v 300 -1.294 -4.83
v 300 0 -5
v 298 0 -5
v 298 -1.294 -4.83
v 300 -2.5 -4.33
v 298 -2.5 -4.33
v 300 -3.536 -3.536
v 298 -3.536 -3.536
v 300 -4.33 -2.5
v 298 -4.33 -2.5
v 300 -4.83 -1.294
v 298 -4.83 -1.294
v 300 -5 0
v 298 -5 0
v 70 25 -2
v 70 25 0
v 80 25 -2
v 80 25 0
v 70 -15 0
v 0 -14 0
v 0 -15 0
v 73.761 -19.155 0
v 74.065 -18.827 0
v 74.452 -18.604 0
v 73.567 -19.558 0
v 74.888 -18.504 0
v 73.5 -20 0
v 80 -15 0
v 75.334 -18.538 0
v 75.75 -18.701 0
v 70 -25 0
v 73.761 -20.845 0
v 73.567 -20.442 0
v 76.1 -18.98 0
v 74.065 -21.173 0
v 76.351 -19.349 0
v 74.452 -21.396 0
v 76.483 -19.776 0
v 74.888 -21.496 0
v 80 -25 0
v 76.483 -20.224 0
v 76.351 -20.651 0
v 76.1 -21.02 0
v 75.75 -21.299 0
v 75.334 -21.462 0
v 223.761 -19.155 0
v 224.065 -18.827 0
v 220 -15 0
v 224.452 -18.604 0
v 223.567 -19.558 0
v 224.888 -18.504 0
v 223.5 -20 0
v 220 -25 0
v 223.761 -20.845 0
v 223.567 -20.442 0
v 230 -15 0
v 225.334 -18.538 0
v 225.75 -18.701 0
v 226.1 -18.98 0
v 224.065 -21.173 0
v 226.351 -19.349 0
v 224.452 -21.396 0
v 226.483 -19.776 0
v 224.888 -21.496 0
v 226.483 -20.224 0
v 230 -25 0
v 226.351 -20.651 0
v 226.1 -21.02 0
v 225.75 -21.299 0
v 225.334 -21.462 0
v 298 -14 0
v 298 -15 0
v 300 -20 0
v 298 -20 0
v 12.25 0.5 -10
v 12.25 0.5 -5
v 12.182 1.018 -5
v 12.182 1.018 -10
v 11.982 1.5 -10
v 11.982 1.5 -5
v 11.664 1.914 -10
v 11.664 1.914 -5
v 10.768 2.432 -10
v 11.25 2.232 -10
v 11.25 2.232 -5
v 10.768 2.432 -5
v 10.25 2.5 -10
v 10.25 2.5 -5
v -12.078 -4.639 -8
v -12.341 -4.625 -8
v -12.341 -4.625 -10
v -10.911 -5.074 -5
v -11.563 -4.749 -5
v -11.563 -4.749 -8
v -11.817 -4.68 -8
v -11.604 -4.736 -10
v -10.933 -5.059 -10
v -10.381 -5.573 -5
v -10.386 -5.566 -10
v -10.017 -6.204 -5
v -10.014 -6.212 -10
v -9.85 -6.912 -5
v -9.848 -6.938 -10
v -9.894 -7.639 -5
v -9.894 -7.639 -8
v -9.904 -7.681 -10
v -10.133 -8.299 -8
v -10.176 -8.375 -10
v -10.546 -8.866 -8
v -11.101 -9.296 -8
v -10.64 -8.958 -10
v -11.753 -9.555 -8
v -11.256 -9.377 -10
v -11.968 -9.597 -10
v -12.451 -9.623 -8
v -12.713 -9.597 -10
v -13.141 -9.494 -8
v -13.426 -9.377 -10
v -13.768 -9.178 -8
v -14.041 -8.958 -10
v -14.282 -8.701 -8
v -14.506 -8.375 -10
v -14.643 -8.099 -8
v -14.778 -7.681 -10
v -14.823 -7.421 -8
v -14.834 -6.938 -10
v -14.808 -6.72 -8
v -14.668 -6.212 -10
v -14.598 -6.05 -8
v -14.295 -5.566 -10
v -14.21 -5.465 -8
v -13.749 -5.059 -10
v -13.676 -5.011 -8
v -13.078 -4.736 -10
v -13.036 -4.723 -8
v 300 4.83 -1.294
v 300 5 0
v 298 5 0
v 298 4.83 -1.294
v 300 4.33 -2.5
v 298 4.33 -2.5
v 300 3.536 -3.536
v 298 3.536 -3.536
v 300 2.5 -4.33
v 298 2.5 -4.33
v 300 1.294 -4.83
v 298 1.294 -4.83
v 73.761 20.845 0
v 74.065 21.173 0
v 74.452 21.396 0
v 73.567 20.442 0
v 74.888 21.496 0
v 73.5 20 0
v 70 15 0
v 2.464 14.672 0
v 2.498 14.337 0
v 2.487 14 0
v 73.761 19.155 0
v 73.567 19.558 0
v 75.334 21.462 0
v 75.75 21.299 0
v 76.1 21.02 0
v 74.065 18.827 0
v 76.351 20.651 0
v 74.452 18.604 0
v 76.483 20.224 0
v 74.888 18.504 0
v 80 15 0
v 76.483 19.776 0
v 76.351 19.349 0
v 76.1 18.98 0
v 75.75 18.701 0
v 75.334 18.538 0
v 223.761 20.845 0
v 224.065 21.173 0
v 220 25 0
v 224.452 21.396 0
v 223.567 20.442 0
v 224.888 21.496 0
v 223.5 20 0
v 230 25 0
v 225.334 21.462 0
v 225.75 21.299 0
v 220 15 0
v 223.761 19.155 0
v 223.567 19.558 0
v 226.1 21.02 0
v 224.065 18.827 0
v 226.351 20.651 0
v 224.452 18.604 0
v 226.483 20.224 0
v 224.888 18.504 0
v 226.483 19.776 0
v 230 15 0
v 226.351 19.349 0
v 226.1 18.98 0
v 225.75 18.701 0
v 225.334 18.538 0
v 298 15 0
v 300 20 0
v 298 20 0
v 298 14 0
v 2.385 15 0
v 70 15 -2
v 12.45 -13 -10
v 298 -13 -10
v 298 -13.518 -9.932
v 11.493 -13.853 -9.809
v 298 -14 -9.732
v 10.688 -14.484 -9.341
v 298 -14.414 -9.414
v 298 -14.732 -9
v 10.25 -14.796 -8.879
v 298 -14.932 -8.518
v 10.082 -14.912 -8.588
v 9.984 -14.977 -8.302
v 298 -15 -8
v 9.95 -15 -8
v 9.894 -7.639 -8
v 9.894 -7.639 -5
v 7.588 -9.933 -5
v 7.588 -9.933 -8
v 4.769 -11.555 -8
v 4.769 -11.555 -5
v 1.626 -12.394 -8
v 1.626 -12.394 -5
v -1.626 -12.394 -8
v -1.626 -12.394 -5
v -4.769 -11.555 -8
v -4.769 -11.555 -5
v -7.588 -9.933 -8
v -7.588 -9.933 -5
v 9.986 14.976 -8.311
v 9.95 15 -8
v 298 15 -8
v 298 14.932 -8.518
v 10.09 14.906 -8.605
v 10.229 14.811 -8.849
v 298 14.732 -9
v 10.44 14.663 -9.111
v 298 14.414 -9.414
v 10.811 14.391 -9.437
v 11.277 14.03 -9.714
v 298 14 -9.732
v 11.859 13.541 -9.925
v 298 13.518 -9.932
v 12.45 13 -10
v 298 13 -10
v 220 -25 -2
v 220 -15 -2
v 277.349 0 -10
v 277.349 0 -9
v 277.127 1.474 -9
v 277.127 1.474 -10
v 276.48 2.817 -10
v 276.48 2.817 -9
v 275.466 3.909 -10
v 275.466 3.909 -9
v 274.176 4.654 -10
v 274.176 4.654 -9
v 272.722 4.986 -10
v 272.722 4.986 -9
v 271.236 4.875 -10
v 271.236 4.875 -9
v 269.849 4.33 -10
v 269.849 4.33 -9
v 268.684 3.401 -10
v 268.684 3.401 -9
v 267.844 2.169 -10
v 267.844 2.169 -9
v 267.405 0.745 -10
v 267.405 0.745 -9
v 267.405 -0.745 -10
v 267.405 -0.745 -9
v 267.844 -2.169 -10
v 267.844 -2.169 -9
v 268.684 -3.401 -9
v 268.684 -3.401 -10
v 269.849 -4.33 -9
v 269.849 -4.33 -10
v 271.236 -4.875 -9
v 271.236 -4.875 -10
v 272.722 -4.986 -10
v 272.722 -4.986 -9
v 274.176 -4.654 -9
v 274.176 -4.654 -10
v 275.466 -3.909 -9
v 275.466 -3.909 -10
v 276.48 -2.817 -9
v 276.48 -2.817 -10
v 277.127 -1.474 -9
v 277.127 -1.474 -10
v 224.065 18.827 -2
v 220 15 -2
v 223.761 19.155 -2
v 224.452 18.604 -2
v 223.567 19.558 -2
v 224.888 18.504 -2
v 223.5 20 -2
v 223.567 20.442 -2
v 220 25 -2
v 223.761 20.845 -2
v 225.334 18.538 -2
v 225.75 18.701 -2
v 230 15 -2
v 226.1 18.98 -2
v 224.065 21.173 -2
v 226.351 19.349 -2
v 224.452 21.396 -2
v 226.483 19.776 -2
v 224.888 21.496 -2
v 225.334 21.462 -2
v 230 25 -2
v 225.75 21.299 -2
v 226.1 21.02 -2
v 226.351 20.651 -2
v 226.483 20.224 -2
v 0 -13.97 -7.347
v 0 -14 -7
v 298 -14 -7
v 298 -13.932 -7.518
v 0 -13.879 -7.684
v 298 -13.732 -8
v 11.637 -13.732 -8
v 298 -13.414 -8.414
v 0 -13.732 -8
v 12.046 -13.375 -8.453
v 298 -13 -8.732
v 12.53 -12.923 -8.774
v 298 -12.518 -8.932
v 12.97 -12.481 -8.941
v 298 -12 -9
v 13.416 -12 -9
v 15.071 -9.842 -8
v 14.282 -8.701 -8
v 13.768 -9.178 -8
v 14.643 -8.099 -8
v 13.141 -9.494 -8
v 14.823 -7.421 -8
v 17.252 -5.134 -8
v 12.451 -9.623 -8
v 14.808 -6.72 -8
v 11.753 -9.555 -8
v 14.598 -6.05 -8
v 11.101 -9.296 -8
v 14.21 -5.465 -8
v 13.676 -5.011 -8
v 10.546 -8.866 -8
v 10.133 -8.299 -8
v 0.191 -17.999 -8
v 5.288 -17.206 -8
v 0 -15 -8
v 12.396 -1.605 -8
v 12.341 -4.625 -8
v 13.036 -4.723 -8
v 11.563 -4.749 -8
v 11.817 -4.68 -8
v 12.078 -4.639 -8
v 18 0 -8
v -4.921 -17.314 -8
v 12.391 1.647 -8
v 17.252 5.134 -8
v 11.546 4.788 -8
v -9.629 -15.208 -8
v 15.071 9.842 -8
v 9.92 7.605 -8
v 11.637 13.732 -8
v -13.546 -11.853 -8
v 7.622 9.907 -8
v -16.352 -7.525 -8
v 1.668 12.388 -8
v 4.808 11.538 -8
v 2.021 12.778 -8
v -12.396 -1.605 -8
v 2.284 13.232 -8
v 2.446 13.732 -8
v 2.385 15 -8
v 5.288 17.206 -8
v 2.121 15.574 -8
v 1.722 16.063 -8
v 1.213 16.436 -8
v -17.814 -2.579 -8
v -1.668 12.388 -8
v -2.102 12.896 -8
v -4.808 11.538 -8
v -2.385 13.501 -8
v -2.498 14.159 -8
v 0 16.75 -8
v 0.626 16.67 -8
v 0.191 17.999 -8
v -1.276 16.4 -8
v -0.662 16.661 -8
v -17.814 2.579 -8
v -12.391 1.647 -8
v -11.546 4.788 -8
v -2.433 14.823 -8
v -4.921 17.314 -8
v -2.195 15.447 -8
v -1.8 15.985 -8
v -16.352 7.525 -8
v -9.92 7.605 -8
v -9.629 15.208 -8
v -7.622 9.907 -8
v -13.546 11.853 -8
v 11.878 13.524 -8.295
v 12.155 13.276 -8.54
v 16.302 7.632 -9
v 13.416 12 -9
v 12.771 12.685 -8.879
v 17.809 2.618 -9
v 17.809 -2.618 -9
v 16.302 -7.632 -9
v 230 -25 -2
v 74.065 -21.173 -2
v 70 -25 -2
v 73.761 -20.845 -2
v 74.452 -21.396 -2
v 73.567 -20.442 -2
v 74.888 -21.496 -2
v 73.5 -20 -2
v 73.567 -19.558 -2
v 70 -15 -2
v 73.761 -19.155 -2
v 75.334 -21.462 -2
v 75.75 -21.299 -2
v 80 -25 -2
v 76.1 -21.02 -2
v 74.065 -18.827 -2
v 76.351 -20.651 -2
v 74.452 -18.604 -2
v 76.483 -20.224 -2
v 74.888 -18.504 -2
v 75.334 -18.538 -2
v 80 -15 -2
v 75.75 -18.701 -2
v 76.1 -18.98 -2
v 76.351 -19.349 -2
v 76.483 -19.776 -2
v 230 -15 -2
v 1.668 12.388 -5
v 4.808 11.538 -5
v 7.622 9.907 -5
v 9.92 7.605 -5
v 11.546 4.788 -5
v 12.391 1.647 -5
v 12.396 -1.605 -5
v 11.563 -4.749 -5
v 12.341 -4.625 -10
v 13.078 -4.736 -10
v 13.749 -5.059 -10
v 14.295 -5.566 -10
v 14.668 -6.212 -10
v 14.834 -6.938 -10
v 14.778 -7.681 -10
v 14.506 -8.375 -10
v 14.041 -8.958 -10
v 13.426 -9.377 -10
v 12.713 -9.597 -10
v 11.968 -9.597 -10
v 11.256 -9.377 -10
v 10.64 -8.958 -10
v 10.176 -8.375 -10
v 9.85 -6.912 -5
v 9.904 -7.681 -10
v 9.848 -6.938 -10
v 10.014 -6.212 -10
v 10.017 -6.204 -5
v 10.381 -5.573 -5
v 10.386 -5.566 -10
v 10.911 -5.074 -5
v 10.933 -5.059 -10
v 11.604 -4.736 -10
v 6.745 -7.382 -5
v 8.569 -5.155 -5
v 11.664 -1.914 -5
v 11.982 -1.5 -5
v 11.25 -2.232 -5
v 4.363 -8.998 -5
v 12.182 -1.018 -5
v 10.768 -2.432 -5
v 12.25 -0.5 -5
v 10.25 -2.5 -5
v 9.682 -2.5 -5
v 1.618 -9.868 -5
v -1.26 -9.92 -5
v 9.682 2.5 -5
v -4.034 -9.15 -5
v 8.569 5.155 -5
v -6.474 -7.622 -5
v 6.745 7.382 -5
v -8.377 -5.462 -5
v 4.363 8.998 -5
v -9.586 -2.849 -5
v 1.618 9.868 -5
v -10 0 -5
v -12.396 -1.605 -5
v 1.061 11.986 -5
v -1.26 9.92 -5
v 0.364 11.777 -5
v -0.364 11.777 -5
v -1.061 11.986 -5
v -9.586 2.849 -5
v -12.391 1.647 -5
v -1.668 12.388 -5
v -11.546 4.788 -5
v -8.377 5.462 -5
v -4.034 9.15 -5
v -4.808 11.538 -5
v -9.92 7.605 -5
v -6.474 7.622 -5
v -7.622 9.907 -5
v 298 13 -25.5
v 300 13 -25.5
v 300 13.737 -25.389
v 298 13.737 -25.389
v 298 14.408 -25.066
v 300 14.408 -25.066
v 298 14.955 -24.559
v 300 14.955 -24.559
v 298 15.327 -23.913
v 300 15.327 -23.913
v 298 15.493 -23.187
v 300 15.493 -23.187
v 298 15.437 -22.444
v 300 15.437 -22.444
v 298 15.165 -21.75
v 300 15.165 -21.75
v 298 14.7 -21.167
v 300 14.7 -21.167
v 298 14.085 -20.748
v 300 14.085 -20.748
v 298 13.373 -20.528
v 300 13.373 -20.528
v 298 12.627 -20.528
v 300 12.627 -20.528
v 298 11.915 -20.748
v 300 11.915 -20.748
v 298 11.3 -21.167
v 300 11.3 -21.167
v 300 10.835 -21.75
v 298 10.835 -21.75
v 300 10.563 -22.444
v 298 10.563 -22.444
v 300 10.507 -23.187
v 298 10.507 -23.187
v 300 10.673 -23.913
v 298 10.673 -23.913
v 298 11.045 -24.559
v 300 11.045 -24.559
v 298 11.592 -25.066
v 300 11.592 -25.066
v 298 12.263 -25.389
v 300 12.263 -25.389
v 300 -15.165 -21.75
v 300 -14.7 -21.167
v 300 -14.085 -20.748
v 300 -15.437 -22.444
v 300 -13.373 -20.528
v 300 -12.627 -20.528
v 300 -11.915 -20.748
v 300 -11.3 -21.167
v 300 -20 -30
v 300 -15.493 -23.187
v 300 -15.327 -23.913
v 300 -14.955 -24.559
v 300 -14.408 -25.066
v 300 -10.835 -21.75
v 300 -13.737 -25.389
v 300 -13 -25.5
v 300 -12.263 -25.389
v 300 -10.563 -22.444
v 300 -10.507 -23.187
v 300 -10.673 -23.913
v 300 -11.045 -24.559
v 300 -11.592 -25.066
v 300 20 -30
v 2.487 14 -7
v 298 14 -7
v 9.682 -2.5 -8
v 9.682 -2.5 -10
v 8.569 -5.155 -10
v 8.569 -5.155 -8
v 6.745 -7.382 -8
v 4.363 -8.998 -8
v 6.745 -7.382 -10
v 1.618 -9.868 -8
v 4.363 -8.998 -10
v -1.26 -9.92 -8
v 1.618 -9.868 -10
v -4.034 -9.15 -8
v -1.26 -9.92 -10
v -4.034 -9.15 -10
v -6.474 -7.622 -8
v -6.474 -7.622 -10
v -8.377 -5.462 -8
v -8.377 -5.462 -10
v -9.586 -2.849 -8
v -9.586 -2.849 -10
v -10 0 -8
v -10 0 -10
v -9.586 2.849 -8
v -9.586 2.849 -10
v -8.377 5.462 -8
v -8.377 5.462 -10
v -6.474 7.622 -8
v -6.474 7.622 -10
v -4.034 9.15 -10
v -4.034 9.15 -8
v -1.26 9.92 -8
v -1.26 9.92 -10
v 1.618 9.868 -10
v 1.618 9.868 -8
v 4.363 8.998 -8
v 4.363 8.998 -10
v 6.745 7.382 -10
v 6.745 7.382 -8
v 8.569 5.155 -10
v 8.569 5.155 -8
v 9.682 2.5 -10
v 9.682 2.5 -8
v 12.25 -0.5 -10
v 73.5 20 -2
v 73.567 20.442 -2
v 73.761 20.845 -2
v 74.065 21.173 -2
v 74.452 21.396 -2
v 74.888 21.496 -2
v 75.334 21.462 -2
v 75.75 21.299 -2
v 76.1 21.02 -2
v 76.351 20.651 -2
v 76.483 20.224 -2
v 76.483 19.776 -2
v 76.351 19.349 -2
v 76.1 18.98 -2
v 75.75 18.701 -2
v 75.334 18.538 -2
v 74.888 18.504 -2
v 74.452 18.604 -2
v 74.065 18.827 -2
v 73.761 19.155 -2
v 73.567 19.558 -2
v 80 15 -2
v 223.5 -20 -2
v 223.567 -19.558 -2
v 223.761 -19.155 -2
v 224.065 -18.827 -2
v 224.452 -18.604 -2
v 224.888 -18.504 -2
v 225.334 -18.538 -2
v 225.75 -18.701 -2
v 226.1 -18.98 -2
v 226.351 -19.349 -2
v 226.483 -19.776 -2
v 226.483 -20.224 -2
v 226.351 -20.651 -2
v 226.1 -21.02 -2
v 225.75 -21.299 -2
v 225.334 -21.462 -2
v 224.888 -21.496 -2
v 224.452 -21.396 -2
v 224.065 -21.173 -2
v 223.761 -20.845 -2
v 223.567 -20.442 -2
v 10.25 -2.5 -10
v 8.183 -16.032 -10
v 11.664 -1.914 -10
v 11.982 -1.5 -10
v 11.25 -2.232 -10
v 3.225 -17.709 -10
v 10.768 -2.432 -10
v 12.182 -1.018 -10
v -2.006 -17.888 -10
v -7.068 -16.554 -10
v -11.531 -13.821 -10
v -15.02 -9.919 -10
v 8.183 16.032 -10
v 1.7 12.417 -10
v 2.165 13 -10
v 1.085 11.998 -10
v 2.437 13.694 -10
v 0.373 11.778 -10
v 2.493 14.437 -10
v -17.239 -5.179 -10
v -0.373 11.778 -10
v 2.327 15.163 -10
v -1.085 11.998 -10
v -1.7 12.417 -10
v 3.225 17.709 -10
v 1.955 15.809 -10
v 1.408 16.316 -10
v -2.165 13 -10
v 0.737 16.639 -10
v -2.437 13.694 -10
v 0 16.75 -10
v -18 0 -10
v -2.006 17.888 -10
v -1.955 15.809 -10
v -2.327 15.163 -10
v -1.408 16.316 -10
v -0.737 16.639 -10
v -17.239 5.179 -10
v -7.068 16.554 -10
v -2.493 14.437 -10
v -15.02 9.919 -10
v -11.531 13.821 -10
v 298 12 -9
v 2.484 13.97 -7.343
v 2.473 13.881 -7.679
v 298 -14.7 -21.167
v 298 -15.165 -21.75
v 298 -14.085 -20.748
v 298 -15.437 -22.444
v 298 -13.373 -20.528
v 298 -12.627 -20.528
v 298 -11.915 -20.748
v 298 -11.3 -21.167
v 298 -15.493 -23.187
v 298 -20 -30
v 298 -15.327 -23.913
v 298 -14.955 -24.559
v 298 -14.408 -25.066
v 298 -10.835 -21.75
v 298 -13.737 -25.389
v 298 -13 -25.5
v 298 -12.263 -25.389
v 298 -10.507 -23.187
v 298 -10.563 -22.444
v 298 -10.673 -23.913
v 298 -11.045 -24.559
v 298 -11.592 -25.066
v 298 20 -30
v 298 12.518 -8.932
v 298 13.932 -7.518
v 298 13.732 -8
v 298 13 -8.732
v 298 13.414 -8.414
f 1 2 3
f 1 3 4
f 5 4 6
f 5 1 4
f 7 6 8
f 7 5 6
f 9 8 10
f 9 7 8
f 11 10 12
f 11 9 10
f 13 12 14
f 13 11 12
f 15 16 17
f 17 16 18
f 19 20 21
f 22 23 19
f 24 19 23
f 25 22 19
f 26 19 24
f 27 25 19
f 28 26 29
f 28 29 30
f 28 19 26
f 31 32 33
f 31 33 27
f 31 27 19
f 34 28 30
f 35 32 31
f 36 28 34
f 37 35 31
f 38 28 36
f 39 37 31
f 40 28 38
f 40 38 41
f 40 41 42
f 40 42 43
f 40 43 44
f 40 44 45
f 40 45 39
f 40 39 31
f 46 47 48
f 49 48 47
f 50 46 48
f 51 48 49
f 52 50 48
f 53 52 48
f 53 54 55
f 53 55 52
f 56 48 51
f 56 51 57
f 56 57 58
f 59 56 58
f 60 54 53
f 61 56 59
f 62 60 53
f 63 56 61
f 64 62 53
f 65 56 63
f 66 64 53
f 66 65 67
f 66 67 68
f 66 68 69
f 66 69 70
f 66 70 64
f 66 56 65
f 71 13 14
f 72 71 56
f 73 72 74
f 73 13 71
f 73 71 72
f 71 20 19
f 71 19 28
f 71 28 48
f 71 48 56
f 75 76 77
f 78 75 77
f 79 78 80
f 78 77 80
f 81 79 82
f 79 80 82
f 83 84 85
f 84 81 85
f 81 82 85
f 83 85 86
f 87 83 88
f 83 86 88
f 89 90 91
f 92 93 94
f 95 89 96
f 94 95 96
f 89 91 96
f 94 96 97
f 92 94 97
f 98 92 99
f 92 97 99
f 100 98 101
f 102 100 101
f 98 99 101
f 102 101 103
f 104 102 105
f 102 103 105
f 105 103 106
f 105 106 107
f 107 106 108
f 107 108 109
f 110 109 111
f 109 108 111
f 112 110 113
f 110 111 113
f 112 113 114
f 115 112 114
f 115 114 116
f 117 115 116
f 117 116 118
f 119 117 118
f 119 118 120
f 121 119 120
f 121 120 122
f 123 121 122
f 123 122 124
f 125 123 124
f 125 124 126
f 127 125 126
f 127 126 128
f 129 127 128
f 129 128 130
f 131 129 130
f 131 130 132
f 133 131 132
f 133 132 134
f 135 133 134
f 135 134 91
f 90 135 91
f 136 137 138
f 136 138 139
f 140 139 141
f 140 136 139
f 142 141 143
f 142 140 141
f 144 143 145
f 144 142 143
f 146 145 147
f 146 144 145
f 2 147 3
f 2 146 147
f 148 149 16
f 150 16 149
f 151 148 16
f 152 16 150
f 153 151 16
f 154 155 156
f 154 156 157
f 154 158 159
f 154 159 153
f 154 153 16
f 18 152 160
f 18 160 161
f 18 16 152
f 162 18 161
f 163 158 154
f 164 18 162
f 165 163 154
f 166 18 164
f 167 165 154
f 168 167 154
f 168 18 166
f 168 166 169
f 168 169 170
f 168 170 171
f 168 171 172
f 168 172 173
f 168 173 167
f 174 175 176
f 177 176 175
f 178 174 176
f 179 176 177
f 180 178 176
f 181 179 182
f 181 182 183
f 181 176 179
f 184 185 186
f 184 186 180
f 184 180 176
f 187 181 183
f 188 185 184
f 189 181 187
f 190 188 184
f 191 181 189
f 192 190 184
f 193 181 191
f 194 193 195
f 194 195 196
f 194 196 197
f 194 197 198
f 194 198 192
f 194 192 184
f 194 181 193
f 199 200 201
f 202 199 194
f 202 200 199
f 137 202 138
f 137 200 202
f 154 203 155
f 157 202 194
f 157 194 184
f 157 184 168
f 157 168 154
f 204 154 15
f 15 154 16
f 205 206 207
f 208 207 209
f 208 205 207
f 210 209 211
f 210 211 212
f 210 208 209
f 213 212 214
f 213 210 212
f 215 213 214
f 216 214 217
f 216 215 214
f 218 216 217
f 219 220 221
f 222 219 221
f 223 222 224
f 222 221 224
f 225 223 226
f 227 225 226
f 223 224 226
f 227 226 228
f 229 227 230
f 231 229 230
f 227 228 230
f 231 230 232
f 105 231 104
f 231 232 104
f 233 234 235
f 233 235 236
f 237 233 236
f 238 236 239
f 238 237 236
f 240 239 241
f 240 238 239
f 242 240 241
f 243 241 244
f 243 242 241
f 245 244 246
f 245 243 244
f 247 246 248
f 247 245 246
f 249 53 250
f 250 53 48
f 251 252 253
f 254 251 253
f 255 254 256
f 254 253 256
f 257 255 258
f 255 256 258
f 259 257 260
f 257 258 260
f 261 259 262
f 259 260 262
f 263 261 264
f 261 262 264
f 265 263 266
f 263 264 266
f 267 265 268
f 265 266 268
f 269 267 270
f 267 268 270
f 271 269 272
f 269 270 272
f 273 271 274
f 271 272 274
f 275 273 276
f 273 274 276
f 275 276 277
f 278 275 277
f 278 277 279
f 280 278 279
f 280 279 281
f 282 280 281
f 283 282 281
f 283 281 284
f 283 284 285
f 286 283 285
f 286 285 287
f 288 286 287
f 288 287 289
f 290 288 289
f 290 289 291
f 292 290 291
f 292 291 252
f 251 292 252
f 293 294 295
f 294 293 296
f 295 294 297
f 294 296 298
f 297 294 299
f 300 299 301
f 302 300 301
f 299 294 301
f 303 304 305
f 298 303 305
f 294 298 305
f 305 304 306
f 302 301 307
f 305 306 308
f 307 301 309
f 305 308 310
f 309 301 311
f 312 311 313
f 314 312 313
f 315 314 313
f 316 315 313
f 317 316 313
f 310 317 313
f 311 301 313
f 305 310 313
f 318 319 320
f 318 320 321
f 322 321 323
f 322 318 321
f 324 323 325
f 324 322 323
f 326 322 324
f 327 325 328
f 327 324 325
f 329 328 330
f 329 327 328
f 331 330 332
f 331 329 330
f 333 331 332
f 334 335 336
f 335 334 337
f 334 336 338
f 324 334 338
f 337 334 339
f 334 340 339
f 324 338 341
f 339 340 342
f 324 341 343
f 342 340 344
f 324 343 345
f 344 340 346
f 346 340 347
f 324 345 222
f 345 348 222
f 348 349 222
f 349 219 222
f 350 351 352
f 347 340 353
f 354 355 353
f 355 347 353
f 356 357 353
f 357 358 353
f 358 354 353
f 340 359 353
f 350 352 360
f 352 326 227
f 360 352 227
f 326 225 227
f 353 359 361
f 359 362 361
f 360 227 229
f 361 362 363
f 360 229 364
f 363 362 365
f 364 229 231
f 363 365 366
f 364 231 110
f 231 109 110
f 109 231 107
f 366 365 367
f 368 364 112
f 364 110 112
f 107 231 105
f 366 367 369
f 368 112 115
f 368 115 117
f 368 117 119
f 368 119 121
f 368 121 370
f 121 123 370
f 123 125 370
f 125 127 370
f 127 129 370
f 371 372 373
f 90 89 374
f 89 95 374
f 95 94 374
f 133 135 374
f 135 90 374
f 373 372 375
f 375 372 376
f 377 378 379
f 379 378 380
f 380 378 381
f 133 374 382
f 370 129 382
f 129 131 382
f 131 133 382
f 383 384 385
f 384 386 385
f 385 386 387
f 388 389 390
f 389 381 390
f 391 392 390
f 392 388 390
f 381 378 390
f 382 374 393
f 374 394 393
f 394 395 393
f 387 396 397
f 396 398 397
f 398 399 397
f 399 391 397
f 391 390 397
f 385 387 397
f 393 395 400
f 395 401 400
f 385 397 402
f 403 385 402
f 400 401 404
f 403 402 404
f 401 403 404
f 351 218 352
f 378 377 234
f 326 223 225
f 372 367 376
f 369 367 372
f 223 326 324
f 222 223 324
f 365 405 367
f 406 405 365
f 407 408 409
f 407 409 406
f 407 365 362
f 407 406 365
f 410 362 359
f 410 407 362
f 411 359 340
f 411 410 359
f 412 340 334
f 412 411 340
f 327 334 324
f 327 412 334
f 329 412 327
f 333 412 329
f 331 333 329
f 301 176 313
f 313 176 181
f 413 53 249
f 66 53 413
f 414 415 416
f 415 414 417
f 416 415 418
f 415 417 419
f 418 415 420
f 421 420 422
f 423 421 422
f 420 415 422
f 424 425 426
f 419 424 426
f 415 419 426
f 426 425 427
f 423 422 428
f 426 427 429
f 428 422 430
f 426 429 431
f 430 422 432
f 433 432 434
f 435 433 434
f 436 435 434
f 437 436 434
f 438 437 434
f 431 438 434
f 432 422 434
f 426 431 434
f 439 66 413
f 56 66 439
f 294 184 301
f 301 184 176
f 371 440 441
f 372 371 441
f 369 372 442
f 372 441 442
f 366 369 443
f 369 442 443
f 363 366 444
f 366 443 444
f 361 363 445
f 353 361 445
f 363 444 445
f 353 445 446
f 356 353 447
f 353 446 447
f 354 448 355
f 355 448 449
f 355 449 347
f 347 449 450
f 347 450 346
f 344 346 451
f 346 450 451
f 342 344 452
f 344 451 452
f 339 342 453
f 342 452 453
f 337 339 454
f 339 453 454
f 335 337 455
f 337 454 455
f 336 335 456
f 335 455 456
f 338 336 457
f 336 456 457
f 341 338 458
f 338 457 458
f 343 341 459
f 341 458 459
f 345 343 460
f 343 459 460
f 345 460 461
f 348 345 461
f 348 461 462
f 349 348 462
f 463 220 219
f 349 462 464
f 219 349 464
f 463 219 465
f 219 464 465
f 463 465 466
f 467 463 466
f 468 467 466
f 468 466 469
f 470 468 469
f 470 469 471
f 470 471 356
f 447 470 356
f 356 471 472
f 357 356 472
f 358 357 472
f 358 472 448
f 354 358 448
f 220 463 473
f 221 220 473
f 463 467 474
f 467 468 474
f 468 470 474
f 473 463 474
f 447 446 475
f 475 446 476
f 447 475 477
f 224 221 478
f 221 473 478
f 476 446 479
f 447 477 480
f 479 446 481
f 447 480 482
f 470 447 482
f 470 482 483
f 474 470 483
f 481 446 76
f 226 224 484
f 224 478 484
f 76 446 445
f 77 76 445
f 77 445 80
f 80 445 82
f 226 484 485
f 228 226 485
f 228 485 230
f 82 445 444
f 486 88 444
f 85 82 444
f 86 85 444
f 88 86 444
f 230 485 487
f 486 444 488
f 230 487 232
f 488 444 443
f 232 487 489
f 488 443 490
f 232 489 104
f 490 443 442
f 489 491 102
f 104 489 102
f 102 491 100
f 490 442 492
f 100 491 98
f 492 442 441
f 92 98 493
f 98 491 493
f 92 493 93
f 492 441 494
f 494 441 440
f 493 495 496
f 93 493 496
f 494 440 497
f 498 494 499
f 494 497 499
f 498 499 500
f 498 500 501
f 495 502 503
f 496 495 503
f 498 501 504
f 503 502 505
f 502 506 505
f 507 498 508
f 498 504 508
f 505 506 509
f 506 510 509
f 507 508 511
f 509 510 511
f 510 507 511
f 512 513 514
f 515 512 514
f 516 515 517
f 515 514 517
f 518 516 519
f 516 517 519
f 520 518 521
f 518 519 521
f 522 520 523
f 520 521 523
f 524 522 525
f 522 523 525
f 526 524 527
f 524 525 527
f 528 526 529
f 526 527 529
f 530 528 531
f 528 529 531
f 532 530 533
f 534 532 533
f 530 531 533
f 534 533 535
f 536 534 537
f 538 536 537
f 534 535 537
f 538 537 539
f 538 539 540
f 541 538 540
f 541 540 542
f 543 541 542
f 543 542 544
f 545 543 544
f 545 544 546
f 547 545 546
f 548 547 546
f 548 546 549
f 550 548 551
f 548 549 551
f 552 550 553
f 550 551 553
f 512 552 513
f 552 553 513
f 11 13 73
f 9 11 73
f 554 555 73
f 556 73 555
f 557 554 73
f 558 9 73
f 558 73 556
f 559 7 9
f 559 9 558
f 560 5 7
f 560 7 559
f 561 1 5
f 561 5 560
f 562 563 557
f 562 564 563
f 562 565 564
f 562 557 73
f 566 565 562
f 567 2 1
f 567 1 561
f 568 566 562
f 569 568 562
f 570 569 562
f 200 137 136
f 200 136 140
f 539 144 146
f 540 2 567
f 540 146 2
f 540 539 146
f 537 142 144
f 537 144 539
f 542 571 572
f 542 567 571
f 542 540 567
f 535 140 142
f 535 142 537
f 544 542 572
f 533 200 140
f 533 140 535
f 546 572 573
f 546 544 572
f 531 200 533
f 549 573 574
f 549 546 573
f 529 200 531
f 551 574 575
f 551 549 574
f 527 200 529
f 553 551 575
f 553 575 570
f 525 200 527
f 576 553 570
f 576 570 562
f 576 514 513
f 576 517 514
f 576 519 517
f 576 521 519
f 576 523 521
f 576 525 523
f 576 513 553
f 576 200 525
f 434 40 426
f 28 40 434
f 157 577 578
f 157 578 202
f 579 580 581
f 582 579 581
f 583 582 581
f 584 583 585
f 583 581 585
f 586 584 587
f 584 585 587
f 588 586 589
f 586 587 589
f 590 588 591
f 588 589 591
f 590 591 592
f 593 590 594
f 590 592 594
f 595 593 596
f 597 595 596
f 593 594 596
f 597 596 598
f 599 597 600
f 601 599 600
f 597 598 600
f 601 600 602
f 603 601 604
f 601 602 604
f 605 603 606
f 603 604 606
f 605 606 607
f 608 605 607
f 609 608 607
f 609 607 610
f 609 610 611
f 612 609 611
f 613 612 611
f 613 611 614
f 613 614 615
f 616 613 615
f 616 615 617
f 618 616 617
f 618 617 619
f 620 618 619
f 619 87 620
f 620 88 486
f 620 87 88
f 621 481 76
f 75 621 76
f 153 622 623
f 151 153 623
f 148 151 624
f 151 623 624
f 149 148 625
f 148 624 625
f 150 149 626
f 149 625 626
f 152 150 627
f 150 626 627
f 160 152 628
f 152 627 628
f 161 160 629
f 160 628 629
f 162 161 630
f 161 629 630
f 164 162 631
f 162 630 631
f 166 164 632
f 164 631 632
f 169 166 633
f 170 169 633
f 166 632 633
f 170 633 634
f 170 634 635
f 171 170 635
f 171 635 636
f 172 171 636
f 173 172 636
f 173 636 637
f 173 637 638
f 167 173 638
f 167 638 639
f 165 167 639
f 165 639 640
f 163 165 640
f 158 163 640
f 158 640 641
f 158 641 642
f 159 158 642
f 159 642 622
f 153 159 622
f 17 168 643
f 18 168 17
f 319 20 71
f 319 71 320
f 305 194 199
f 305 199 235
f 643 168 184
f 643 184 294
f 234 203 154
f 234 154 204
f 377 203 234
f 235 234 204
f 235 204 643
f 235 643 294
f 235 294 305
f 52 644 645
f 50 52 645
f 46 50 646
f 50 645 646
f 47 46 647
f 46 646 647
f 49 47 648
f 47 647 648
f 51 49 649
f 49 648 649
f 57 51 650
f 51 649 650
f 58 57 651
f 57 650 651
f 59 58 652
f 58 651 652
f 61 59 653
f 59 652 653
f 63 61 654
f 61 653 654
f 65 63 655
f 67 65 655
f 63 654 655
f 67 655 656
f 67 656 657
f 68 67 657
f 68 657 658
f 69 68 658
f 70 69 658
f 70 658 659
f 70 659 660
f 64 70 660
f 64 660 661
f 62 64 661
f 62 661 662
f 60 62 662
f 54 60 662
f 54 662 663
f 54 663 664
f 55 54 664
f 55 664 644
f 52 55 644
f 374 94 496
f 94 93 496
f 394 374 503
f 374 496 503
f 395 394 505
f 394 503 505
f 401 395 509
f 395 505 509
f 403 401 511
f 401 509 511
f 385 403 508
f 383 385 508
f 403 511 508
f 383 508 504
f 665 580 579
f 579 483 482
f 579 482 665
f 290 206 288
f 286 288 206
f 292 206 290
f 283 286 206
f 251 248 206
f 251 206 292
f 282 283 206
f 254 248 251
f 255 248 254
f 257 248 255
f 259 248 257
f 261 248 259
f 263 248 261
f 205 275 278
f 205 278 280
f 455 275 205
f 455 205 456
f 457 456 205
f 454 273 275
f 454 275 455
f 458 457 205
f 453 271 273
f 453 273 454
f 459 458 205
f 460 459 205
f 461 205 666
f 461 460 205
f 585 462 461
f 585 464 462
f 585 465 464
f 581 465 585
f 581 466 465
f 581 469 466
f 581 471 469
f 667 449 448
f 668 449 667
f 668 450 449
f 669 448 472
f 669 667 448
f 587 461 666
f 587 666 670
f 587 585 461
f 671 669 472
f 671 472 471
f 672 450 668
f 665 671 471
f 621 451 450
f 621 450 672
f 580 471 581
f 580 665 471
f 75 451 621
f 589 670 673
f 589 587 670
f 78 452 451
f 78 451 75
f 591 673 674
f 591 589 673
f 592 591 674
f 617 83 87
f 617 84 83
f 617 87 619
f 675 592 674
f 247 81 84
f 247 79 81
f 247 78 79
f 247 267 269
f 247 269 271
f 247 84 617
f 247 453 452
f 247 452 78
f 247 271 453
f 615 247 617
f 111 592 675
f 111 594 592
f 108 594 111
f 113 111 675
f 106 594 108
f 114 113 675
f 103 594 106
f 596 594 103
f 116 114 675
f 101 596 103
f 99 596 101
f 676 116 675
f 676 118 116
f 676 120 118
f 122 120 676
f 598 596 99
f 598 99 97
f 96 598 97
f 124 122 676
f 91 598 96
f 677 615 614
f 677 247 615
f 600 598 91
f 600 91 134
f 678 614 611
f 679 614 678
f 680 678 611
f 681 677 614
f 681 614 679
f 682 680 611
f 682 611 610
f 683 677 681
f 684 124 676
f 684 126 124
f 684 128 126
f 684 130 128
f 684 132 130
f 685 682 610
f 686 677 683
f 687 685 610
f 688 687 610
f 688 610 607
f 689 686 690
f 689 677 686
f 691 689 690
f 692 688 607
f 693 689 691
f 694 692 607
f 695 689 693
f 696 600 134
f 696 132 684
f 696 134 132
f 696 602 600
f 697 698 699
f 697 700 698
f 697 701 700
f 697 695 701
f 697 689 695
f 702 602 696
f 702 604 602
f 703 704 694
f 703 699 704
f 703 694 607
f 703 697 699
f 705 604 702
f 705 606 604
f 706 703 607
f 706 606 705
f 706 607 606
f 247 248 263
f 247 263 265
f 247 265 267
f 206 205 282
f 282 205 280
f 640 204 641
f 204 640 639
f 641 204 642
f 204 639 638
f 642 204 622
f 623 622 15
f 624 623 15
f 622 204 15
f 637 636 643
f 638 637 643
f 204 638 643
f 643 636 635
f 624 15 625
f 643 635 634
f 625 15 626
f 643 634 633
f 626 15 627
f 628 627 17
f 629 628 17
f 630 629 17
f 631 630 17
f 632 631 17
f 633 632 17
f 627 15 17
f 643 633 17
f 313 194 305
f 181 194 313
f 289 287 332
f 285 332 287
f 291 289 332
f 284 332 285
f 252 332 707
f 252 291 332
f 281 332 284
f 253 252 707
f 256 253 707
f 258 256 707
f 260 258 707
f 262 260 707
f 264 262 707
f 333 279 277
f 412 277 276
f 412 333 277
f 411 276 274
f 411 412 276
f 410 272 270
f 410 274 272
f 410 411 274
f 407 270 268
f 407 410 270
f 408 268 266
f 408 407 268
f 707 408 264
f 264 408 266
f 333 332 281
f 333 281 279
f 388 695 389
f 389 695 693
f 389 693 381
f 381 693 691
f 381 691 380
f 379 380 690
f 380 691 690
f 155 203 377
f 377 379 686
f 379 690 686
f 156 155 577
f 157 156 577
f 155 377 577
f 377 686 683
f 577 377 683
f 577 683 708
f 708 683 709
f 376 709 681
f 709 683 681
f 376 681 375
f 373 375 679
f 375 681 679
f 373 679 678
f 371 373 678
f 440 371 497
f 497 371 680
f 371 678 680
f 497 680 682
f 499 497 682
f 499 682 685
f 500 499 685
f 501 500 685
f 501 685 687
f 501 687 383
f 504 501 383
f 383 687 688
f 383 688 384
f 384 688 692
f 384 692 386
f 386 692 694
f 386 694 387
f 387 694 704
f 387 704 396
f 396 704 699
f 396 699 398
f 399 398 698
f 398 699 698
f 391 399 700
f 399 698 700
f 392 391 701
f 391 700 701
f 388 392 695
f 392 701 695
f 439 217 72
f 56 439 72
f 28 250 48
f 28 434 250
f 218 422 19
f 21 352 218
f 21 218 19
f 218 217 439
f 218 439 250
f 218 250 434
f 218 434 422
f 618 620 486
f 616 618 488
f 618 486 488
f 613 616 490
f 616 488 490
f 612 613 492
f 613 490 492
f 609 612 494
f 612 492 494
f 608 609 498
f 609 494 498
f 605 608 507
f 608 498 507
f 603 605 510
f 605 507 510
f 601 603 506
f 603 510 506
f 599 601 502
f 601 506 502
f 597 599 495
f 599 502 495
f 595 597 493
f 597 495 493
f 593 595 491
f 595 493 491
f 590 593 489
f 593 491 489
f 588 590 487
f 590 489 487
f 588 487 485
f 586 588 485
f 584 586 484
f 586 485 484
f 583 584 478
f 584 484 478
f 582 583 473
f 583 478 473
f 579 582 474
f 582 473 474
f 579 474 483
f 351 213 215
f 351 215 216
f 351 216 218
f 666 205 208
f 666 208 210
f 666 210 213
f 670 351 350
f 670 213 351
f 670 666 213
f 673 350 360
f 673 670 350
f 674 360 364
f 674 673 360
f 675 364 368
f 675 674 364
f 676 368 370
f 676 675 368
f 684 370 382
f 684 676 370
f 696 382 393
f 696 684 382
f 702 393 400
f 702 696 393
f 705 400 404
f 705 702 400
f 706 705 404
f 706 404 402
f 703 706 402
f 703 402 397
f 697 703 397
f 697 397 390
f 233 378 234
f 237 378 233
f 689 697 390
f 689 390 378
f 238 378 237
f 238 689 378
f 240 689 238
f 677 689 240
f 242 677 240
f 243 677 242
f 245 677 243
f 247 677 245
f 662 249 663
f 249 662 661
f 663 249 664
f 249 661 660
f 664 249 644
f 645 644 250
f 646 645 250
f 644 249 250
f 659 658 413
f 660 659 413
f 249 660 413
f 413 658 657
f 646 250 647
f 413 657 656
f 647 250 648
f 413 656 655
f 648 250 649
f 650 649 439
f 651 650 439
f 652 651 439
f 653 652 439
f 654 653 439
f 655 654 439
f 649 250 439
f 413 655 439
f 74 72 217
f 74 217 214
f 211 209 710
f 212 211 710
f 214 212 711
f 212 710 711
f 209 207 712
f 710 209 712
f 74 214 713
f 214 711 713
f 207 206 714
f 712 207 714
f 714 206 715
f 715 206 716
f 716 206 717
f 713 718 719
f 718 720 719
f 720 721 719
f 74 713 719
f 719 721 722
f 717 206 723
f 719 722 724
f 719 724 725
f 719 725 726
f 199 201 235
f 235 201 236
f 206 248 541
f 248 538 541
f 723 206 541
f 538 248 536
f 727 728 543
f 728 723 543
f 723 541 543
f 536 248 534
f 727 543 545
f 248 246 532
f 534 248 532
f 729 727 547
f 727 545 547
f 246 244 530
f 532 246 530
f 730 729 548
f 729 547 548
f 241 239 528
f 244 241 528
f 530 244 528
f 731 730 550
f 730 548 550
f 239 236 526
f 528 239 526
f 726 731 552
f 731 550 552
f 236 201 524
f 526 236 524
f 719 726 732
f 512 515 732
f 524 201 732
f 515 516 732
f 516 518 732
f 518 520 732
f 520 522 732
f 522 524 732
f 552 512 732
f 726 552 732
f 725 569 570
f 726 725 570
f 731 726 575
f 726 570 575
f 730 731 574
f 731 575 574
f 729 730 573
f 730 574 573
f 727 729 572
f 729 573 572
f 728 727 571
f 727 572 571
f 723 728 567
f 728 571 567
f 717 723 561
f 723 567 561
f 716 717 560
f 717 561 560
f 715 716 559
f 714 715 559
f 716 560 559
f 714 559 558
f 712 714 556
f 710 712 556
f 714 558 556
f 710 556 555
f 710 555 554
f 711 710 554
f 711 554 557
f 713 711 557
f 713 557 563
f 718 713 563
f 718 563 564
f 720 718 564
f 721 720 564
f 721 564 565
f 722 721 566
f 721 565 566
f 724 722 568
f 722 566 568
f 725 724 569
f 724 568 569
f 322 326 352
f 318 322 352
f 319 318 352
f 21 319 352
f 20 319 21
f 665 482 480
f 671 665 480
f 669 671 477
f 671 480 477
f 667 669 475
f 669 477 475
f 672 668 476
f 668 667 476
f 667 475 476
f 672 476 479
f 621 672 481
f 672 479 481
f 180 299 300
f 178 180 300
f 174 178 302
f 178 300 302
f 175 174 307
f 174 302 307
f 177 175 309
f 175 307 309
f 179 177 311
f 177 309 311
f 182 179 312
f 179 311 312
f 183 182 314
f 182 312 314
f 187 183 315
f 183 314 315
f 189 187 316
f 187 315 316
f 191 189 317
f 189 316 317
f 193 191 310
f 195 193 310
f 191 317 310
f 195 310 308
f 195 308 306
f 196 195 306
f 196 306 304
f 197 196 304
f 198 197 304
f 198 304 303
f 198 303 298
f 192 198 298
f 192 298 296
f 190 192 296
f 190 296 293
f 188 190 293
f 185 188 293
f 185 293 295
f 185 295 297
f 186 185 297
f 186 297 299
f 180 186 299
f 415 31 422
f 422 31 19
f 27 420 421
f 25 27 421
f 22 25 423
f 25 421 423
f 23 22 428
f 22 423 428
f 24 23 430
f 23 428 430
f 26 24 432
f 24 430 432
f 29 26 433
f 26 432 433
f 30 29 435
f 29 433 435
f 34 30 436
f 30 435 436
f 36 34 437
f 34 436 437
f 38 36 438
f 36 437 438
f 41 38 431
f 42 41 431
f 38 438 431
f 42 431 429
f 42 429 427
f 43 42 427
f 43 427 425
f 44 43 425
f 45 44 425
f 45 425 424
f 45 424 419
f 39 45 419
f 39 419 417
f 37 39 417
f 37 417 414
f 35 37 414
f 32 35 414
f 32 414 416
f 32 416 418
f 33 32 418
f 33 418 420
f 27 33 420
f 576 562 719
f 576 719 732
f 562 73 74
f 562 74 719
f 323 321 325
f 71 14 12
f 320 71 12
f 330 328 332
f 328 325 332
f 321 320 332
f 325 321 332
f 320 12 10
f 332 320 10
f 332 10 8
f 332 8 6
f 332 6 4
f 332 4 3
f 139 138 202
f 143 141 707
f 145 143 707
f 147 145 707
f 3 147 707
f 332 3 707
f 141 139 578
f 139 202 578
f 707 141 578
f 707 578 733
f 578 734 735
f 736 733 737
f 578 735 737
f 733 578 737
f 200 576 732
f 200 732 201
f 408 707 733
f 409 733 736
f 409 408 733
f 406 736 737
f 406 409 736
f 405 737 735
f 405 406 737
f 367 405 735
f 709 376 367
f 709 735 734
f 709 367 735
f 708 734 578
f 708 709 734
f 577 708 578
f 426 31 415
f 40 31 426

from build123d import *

# Parameters (mm, degrees)
BOSS_EXTRUDE1_DEPTH     = 300
SKETCH2_W               = 10
SKETCH2_H               = 10
BOSS_EXTRUDE2_DEPTH     = 2
SKETCH4_R               = 18
SKETCH4_R_2             = 15
SKETCH4_R_3             = 10
BOSS_EXTRUDE3_DEPTH     = 2
SKETCH4_3_R             = 10
CUT_EXTRUDE1_DEPTH      = 2
BOSS_EXTRUDE4_START     = -5
BOSS_EXTRUDE4_OUTLINE_R = 12.5
BOSS_EXTRUDE4_DEPTH     = 3
CUT_EXTRUDE2_START      = -2
CUT_EXTRUDE2_DEPTH      = 2
F_3_0MM_DOWEL_HOLE1_D   = 3
SKETCH8_R               = 2.5
BOSS_EXTRUDE5_DEPTH     = 2
SKETCH9_R               = 5
CUT_EXTRUDE3_DEPTH      = 32
SKETCH10_R              = 2.5
CUT_EXTRUDE4_DEPTH      = 10


# Read off the part's stored shape, not the designer's step: Boss-Extrude4, Cut-Extrude2
with BuildPart() as part:
    # Sketch1 → Boss-Extrude1 (new body)
    with BuildSketch(Plane(origin=(0, 0, 0), x_dir=(0, 0, -1), z_dir=(1, 0, 0))):
        with BuildLine():
            Line((10, 13), (10, -13))
            ThreePointArc((10, -13), (9.414213562, -14.414213562), (8, -15))
            Line((8, -15), (0, -15))
            Line((0, -15), (0, -14))
            Line((0, -14), (7, -14))
            ThreePointArc((7, -14), (8.414213562, -13.414213562), (9, -12))
            Line((9, -12), (9, 12))
            ThreePointArc((9, 12), (8.414213562, 13.414213562), (7, 14))
            Line((7, 14), (0, 14))
            Line((0, 14), (0, 15))
            Line((0, 15), (8, 15))
            ThreePointArc((8, 15), (9.414213562, 14.414213562), (10, 13))
        make_face()
    extrude(amount=BOSS_EXTRUDE1_DEPTH)

    # Sketch2 → Boss-Extrude2 (add)
    with BuildSketch(Plane.XY):
        with Locations((75, 20)):
            Rectangle(SKETCH2_W, SKETCH2_H)
        with Locations((75, -20)):
            Rectangle(SKETCH2_W, SKETCH2_H)
        with Locations((225, 20)):
            Rectangle(SKETCH2_W, SKETCH2_H)
        with Locations((225, -20)):
            Rectangle(SKETCH2_W, SKETCH2_H)
    extrude(amount=-BOSS_EXTRUDE2_DEPTH)

    # Sketch4 → Boss-Extrude3 (add)
    # profile 1 of 2: a face of its own
    with BuildSketch(Plane(origin=(0, 0, -10), x_dir=(-1, 0, 0), z_dir=(0, 0, -1))):
        Circle(SKETCH4_R)
        Circle(SKETCH4_R_2, mode=Mode.SUBTRACT)
    # profile 2 of 2: a face of its own
    with BuildSketch(Plane(origin=(0, 0, -10), x_dir=(-1, 0, 0), z_dir=(0, 0, -1))):
        Circle(SKETCH4_R)
        with Locations(Location((0, 0, 0), (0, 0, 90))):
            Circle(SKETCH4_R_3, mode=Mode.SUBTRACT)
    extrude(amount=-BOSS_EXTRUDE3_DEPTH)

    # Sketch4<3> → Cut-Extrude1 (cut)
    with BuildSketch(Plane(origin=(0, 0, -10), x_dir=(-1, 0, 0), z_dir=(0, 0, -1))):
        with Locations(Location((0, 0, 0), (0, 0, 90))):
            Circle(SKETCH4_3_R)
    extrude(amount=-CUT_EXTRUDE1_DEPTH, mode=Mode.SUBTRACT)

    # Boss-Extrude4 outline → Boss-Extrude4 (add)
    with BuildSketch(Plane(origin=(0, 0, -10), x_dir=(-1, 0, 0), z_dir=(0, 0, -1)).offset(BOSS_EXTRUDE4_START)):
        Circle(BOSS_EXTRUDE4_OUTLINE_R)
        with BuildLine():
            ThreePointArc((-9.682458366, 2.5), (10, 0), (-9.682458366, -2.5))
            Line((-9.682458366, -2.5), (-10.25, -2.5))
            ThreePointArc((-10.25, -2.5), (-11.664213562, -1.914213562), (-12.25, -0.5))
            Line((-12.25, -0.5), (-12.25, 0.5))
            ThreePointArc((-12.25, 0.5), (-11.664213562, 1.914213562), (-10.25, 2.5))
            Line((-10.25, 2.5), (-9.682458366, 2.5))
        make_face(mode=Mode.SUBTRACT)
    extrude(amount=BOSS_EXTRUDE4_DEPTH)

    # Cut-Extrude2 outline → Cut-Extrude2 (cut)
    with BuildSketch(Plane(origin=(0, 0, -10), x_dir=(-1, 0, 0), z_dir=(0, 0, -1)).offset(CUT_EXTRUDE2_START)):
        with BuildLine():
            ThreePointArc((-10.25, 2.5), (-11.664213562, 1.914213562), (-12.25, 0.5))
            Line((-12.25, 0.5), (-12.25, -0.5))
            ThreePointArc((-12.25, -0.5), (-11.664213562, -1.914213562), (-10.25, -2.5))
            Line((-10.25, -2.5), (-9.682458366, -2.5))
            ThreePointArc((-9.682458366, -2.5), (-10, 0), (-9.682458366, 2.5))
            Line((-9.682458366, 2.5), (-10.25, 2.5))
        make_face()
    extrude(amount=CUT_EXTRUDE2_DEPTH, mode=Mode.SUBTRACT)

    # Ø3.0mm Dowel Hole1 (through all)
    with Locations(Plane.XY):
        with Locations((75, 20), (75, -20), (225, 20), (225, -20)):
            Hole(F_3_0MM_DOWEL_HOLE1_D / 2)

    # Sketch8 → Boss-Extrude5 (add)
    with BuildSketch(Plane(origin=(300, 0, 0), x_dir=(0, 0, -1), z_dir=(1, 0, 0))):
        with BuildLine():
            Line((0, -5), (0, -20))
            Line((0, -20), (30, -20))
            Line((30, -20), (30, 20))
            Line((30, 20), (0, 20))
            Line((0, 20), (0, 5))
            ThreePointArc((0, 5), (3.535533906, 3.535533906), (5, 0))
            ThreePointArc((5, 0), (3.535533906, -3.535533906), (0, -5))
        make_face()
        with Locations((23, -13)):
            Circle(SKETCH8_R, mode=Mode.SUBTRACT)
        with Locations((23, 13)):
            Circle(SKETCH8_R, mode=Mode.SUBTRACT)
    extrude(amount=-BOSS_EXTRUDE5_DEPTH)

    # Sketch9 → Cut-Extrude3 (cut)
    with BuildSketch(Plane.XY):
        with Locations((272.348806761, 0)):
            Circle(SKETCH9_R)
    extrude(amount=-CUT_EXTRUDE3_DEPTH, mode=Mode.SUBTRACT)

    # Sketch10 → Cut-Extrude4 (cut)
    with BuildSketch(Plane(origin=(0, 0, -10), x_dir=(-1, 0, 0), z_dir=(0, 0, -1))):
        with Locations(Location((0, 14.25, 0), (0, 0, 90))):
            Circle(SKETCH10_R)
        with Locations(Location((12.340862004, -7.125, 0), (0, 0, 90))):
            Circle(SKETCH10_R)
        with Locations(Location((-12.340862004, -7.125, 0), (0, 0, 90))):
            Circle(SKETCH10_R)
    extrude(amount=-CUT_EXTRUDE4_DEPTH, mode=Mode.SUBTRACT)


solid = part.part
